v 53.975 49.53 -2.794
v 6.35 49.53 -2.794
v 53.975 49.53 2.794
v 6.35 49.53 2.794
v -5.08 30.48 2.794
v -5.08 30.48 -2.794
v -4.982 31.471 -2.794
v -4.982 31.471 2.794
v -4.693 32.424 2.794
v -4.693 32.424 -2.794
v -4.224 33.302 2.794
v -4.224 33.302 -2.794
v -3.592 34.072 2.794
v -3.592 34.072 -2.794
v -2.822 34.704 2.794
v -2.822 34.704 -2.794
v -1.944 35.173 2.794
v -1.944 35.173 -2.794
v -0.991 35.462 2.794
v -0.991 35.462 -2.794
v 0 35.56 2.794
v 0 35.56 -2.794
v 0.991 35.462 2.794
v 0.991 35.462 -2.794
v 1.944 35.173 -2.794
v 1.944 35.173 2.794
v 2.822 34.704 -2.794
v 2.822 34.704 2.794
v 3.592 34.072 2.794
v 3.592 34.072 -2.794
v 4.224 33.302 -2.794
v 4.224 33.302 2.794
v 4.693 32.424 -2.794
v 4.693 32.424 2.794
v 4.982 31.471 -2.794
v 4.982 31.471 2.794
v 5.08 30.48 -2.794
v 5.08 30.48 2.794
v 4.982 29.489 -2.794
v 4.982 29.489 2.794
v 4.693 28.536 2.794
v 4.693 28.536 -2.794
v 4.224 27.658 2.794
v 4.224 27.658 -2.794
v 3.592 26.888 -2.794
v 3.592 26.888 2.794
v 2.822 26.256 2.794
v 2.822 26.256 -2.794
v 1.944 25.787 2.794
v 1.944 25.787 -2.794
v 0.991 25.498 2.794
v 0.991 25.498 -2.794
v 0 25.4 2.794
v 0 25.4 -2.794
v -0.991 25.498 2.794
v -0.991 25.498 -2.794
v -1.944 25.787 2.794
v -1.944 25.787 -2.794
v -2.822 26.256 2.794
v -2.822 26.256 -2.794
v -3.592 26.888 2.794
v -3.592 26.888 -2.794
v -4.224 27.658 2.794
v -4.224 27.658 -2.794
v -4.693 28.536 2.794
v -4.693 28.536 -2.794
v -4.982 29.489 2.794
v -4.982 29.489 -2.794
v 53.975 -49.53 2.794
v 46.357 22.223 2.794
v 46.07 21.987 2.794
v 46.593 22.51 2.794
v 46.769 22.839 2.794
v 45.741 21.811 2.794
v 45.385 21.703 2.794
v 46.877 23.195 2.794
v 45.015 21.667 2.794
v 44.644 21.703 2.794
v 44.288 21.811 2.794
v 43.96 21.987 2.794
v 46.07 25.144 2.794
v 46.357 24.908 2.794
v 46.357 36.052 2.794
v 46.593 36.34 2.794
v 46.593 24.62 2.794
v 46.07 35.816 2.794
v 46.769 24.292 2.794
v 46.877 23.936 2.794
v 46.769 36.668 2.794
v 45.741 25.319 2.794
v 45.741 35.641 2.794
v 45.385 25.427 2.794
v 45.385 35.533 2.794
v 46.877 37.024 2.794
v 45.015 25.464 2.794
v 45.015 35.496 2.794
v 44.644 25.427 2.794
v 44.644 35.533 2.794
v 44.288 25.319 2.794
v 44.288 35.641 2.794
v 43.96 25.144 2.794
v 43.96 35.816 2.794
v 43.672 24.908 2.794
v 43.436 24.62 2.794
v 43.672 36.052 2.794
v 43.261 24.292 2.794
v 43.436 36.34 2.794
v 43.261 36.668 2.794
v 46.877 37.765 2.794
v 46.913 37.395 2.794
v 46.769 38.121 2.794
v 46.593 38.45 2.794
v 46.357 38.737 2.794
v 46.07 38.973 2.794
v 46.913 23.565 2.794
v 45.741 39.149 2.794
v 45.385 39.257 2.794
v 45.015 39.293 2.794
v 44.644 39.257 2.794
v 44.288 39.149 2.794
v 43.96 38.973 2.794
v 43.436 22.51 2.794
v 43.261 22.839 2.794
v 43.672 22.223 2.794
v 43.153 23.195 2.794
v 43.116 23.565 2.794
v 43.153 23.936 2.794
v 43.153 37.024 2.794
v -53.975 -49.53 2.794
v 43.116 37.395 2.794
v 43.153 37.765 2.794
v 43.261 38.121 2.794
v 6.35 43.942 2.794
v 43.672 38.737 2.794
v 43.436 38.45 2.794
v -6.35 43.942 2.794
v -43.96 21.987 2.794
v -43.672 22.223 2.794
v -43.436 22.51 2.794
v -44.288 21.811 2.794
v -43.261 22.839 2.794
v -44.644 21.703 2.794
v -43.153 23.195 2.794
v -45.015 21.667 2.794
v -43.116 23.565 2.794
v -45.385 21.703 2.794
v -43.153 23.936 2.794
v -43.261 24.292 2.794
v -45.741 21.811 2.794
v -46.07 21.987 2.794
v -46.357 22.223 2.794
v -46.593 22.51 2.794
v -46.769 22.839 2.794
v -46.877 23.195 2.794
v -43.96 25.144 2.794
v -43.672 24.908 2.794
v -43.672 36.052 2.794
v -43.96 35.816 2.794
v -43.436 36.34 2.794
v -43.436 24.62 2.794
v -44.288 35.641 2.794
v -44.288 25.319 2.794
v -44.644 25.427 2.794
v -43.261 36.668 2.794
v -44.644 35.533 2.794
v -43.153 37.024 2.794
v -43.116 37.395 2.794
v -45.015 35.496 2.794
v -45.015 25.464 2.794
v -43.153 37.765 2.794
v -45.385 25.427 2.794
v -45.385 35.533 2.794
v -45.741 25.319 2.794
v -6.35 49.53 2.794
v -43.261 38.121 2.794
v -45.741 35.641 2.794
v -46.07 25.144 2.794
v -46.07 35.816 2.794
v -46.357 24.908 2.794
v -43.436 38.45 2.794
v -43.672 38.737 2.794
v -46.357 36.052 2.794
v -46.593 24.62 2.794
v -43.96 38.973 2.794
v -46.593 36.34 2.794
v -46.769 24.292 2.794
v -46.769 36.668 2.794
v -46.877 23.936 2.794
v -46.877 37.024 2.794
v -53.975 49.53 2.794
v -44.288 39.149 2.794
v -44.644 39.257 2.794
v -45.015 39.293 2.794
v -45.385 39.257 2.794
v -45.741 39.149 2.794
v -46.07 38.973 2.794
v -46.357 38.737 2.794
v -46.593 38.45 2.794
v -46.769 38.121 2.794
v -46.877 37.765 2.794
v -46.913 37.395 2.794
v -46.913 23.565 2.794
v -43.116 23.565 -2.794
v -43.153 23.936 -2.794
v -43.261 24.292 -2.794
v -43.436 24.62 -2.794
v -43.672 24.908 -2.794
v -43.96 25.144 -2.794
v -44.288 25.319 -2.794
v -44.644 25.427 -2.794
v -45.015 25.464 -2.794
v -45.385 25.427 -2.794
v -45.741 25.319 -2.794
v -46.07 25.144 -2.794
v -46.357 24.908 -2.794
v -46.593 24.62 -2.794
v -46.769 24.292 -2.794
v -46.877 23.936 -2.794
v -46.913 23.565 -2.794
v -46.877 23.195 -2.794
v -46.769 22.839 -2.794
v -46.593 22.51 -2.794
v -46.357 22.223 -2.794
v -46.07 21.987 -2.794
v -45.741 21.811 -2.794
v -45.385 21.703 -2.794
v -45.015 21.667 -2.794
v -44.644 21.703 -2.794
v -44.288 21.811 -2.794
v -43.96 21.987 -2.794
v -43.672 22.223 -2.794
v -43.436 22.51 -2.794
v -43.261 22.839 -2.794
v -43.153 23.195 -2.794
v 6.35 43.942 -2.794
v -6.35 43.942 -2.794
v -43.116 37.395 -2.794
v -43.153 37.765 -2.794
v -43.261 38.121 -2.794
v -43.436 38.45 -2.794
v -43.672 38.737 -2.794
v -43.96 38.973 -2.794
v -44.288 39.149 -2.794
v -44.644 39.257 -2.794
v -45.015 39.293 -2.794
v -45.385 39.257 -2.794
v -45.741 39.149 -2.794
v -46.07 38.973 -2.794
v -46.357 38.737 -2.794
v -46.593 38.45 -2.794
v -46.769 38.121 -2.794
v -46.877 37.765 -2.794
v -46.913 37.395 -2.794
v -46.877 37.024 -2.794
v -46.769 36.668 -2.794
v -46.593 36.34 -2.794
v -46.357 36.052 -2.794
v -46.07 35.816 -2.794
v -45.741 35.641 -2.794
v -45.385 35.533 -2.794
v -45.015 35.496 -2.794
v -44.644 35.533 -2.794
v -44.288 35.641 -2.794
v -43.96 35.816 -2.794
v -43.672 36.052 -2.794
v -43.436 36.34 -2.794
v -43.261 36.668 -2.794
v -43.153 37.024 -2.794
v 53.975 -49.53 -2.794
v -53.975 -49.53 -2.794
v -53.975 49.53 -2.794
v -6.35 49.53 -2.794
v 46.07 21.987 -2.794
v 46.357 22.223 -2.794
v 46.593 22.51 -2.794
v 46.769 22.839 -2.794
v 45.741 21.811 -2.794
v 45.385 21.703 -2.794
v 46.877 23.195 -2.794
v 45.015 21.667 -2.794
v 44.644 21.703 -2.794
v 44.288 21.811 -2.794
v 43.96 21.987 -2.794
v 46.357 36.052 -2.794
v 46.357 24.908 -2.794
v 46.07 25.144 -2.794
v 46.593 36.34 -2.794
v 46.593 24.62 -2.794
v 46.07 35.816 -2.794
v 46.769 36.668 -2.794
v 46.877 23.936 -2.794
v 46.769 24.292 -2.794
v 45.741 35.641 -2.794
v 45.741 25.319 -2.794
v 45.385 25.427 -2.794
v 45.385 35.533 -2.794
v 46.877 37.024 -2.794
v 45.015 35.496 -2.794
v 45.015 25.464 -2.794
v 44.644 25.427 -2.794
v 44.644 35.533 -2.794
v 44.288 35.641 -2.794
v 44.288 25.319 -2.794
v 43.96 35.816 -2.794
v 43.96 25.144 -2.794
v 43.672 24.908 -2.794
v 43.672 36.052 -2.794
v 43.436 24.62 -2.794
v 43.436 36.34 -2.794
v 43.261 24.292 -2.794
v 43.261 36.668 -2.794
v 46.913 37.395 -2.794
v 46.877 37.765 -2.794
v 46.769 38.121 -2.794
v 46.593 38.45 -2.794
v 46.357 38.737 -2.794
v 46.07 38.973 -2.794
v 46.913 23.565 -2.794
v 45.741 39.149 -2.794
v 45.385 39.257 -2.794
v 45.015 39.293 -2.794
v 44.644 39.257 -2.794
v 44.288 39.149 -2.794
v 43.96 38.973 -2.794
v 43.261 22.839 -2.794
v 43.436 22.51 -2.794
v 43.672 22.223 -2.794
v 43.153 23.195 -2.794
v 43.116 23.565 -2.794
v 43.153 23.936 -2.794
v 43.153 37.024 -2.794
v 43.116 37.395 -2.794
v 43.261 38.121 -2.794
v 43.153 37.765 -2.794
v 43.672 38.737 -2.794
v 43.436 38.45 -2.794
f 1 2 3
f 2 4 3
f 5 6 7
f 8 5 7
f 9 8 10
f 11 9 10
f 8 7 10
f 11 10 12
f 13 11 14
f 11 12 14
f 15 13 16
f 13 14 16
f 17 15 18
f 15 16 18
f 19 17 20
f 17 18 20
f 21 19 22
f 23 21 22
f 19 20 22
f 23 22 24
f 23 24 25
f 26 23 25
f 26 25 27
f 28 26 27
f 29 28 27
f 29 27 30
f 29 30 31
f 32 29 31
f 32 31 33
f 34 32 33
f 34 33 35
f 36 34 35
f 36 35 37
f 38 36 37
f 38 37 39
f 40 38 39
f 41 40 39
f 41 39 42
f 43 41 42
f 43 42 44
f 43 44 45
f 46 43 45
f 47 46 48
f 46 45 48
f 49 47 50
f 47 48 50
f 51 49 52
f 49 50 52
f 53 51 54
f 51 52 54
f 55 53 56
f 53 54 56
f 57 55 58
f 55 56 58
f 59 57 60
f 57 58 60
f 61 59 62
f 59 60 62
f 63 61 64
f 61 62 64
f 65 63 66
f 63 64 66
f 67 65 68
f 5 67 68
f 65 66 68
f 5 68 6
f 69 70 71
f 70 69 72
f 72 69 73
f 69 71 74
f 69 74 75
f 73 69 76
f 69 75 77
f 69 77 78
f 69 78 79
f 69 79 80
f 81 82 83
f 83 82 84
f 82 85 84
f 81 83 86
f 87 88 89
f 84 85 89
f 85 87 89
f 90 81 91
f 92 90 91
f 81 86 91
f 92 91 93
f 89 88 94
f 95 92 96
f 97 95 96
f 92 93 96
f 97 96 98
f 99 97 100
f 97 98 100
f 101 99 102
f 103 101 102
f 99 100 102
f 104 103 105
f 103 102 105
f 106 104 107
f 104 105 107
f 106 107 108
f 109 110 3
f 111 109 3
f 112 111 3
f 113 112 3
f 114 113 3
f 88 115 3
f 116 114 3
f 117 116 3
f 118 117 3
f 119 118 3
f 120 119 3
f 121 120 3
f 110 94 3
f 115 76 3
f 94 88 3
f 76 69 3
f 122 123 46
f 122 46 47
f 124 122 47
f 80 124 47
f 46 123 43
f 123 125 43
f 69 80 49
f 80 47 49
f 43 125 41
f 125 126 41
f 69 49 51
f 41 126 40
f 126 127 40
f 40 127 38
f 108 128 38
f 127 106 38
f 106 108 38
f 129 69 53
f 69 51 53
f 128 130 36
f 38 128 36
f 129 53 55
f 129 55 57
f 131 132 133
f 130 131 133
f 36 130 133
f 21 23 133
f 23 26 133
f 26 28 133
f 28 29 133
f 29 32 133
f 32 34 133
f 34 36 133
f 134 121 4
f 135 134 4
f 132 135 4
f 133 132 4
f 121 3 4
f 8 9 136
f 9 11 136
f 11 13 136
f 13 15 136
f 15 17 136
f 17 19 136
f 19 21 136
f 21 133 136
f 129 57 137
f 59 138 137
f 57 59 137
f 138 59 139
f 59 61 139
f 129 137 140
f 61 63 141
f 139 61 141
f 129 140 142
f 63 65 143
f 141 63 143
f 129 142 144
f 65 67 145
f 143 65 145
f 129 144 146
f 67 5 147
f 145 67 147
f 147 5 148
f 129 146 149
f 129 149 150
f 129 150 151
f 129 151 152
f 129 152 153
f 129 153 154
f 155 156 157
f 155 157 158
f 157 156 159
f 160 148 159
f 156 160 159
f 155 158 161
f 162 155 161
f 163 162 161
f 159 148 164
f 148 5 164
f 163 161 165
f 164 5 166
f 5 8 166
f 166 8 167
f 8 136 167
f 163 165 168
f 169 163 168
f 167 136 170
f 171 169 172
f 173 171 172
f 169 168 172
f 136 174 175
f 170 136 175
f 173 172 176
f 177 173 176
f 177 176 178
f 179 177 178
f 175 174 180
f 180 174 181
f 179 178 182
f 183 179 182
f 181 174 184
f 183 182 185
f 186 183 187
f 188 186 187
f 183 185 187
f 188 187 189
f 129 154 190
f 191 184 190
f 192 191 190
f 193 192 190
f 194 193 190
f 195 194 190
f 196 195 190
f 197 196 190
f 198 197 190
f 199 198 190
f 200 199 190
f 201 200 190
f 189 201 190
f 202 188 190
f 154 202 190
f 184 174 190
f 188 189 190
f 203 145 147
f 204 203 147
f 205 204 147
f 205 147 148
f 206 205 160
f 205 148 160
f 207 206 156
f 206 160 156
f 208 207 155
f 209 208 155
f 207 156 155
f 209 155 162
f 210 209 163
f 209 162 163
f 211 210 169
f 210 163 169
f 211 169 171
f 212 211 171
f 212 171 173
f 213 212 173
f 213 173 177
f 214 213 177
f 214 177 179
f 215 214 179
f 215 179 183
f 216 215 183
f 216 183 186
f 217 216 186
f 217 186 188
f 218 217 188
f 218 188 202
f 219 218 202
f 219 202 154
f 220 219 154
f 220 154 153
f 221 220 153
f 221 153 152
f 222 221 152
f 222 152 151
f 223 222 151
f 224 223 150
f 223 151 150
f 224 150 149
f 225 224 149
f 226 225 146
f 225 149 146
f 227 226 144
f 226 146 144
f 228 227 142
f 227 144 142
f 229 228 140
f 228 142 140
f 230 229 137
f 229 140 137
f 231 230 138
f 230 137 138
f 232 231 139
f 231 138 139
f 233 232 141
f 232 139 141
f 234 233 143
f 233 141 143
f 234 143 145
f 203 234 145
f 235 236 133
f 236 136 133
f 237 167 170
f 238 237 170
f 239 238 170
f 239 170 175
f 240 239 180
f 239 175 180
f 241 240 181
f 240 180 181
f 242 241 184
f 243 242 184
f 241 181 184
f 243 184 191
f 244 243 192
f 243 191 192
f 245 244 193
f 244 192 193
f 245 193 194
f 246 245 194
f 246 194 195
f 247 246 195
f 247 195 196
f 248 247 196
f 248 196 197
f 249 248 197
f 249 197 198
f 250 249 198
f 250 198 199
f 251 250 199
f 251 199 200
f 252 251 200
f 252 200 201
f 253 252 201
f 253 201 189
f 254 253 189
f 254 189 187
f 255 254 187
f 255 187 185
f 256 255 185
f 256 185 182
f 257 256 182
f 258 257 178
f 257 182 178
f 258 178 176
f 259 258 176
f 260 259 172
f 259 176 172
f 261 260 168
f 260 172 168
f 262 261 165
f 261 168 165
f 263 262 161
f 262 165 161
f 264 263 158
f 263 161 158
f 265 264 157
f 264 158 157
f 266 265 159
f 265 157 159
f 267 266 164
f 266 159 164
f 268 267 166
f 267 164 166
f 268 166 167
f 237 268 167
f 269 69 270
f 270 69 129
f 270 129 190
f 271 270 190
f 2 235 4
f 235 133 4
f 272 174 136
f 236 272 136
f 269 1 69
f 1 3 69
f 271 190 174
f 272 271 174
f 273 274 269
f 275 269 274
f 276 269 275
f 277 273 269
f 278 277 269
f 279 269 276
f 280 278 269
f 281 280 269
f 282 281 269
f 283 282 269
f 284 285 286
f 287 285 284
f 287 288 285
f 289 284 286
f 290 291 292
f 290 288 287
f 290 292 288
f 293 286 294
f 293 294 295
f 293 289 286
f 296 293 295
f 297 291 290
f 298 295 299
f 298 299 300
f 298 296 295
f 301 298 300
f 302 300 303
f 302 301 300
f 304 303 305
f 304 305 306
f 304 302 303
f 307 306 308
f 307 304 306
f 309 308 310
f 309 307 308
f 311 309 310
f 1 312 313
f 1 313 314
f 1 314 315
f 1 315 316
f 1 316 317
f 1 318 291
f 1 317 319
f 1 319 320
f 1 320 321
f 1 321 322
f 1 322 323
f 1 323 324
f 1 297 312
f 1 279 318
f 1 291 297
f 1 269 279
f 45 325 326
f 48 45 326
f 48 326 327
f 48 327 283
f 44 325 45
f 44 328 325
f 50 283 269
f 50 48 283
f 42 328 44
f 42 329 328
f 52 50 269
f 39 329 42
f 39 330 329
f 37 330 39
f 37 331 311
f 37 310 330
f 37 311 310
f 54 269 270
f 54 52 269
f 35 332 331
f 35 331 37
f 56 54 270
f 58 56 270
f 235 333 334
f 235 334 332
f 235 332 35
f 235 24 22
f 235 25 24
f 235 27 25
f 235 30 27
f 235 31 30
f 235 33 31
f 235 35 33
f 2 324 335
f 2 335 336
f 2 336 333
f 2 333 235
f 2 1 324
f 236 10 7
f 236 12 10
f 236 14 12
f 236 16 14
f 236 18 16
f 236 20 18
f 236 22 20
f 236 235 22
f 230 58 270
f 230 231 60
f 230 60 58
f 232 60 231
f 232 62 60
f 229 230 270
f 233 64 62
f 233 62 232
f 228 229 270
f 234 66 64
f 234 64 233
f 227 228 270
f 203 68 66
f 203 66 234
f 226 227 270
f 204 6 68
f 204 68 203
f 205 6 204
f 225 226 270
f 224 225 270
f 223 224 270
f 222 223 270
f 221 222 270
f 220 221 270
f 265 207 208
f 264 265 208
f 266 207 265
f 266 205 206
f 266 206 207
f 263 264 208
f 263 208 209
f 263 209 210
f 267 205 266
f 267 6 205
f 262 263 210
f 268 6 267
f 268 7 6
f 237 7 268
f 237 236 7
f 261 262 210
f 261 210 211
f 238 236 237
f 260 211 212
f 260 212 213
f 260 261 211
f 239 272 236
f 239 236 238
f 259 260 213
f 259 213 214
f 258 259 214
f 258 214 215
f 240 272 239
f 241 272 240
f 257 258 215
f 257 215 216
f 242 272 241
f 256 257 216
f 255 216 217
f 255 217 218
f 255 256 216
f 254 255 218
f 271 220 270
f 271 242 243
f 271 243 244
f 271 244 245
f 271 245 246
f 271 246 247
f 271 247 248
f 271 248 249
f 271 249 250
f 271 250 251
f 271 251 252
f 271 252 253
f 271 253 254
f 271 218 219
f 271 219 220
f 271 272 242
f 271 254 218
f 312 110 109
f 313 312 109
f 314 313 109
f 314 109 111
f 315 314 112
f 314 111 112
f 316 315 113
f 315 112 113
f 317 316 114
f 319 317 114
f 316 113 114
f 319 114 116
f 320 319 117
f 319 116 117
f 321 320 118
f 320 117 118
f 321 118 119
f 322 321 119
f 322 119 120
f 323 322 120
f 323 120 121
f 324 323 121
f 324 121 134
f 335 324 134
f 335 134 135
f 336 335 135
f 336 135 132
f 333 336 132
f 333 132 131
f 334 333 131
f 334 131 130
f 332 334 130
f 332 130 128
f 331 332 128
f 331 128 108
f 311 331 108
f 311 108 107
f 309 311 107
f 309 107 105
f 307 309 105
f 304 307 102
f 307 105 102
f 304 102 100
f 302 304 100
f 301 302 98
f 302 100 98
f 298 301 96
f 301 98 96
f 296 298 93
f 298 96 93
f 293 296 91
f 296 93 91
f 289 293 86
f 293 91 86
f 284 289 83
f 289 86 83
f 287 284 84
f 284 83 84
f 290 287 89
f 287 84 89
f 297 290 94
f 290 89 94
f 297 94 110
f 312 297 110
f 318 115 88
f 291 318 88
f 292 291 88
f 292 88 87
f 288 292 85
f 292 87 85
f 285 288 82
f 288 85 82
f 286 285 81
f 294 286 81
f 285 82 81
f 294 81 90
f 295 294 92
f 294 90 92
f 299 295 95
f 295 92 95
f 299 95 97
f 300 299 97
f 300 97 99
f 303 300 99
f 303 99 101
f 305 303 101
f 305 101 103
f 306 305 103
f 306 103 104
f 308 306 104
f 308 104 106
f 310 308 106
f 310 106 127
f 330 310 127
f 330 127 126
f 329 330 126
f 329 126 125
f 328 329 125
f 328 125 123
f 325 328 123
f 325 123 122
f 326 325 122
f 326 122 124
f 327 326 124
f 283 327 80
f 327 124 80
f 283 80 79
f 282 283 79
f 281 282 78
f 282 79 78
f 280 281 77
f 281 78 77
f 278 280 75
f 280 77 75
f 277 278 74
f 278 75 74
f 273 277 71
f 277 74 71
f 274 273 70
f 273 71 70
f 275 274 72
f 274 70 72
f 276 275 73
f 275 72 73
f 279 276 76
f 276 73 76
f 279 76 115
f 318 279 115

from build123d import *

# Parameters (mm, degrees)
BOSS_EXTRUDE1_DEPTH   = 2.794
F_6_CLEARANCE_HOLE1_D = 3.7973
CUT_EXTRUDE1_REACH    = 75.469
SKETCH5_R             = 5.08


with BuildPart() as part:
    # Sketch1 → Boss-Extrude1 (new, symmetric)
    with BuildSketch(Plane.XY):
        Polygon((-6.35, 49.53), (-6.35, 43.942), (6.35, 43.942), (6.35, 49.53), (53.975, 49.53), (53.975, -49.53), (-53.975, -49.53), (-53.975, 49.53), align=None)
    extrude(amount=BOSS_EXTRUDE1_DEPTH, both=True)

    # #6 Clearance Hole1 (through all)
    with Locations(Plane(origin=(0, 0, -2.794), x_dir=(-1, 0, 0), z_dir=(0, 0, -1))):
        with Locations((-45.014797213, 37.394797213), (-45.014797213, 23.565202787), (45.014797213, 37.394797213), (45.014797213, 23.565202787)):
            Hole(F_6_CLEARANCE_HOLE1_D / 2)

    # Sketch5 → Cut-Extrude1 (cut, up to next)
    with BuildSketch(Plane(origin=(0, 0, -2.794), x_dir=(-1, 0, 0), z_dir=(0, 0, -1)), mode=Mode.PRIVATE) as cut_extrude1_sk1:
        with Locations((0, 30.48)):
            Circle(SKETCH5_R)
    cut_extrude1_tool1 = extrude(cut_extrude1_sk1.sketch, amount=-CUT_EXTRUDE1_REACH, mode=Mode.PRIVATE) & part.part
    add(cut_extrude1_tool1.solids().sort_by_distance((0, 30.48, -2.794))[0], mode=Mode.SUBTRACT)


solid = part.part
